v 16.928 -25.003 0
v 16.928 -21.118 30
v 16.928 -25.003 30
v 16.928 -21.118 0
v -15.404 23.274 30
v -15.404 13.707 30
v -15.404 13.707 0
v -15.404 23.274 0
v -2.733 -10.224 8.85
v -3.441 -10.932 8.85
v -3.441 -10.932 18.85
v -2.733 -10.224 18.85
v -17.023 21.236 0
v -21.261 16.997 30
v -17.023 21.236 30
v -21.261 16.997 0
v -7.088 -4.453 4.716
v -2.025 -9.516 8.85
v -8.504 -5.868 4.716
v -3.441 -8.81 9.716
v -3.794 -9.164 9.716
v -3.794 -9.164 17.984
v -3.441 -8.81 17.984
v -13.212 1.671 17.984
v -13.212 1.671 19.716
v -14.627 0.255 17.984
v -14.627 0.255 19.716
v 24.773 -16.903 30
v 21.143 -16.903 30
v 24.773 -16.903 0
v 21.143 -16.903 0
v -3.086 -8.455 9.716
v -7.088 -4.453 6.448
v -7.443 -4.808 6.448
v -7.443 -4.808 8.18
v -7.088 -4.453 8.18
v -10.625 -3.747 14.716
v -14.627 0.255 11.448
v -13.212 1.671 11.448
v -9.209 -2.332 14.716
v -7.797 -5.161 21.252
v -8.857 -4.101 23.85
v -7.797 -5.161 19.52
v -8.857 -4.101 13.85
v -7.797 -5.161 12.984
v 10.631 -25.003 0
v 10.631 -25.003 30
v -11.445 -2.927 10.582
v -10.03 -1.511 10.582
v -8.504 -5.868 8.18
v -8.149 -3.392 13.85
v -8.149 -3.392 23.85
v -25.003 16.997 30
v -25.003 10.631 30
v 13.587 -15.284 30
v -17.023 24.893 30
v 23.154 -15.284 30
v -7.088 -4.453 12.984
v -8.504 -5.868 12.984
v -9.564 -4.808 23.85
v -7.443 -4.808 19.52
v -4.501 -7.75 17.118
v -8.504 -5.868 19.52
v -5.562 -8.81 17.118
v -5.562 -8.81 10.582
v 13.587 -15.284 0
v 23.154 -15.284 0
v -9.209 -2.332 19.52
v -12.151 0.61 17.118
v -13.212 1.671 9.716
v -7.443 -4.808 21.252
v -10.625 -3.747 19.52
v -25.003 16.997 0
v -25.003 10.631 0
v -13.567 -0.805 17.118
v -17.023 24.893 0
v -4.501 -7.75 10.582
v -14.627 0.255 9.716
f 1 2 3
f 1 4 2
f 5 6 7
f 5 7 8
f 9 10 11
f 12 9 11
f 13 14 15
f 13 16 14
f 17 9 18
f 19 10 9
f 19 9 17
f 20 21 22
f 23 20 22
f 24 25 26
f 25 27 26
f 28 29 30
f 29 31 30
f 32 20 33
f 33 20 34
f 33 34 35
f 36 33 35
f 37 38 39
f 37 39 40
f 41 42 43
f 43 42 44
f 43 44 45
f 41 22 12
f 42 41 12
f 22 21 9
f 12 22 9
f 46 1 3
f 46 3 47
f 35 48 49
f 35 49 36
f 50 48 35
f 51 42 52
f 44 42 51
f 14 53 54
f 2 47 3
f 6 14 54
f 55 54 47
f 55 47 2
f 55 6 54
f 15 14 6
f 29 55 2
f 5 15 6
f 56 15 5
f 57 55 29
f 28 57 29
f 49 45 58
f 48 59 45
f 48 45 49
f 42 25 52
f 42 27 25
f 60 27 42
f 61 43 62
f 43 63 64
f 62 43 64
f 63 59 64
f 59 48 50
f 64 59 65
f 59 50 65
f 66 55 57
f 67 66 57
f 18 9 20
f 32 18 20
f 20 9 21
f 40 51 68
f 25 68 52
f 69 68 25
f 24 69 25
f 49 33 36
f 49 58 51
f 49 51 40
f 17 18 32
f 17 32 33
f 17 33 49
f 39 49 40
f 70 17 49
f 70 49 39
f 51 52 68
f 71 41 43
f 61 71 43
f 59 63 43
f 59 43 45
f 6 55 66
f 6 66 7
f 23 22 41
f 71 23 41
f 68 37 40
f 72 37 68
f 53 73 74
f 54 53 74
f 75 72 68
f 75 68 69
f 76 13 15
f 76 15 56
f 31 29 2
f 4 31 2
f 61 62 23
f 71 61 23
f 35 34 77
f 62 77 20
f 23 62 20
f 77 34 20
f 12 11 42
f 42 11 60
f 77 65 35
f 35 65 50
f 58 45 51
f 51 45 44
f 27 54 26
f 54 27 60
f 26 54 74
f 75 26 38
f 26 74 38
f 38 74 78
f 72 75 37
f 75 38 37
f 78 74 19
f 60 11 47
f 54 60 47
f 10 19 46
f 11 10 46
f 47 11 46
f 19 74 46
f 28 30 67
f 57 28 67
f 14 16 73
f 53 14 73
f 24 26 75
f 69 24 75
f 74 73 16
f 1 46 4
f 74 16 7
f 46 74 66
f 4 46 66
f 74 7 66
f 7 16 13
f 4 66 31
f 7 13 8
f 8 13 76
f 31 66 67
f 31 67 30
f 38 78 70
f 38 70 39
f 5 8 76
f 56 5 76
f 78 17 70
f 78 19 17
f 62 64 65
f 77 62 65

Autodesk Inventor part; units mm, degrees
ref_plane "YZ Plane" through (0, 0, 0) normal (1, 0, 0) x (0, 1, 0)
ref_plane "XZ Plane" through (0, 0, 0) normal (0, 1, 0) x (-1, 0, 0)
sketch "Sketch1" plane through (0, 0, 0) normal (0, 0, 1) x (1, 0, 0)
  line L0 (21.1431, -16.9027) -> (16.9281, -21.1177)
  line L1 (-21.2613, 16.9973) -> (-17.0227, 21.2358)
  line L2 (-17.0227, 21.2358) -> (16.9281, -21.1177) construction
  line L3 (21.1431, -16.9027) -> (-21.2613, 16.9973) construction
  line L4 (-17.0227, 21.2358) -> (36.8231, 21.2358) construction
  line L5 (16.9281, -21.1177) -> (16.9281, -25.0027)
  line L6 (-17.0227, 21.2358) -> (-17.0227, 24.8927)
  line L7 (21.1431, -16.9027) -> (24.7727, -16.9027)
  line L8 (24.7727, -16.9027) -> (-17.0227, 24.8927)
  line L9 (-25.0027, 16.9973) -> (-25.0027, 10.6306)
  line L10 (16.9281, -25.0027) -> (10.6306, -25.0027)
  line L11 (-25.0027, 10.6306) -> (10.6306, -25.0027)
  line L12 (-25.0027, 16.9973) -> (-7.0741, 16.9973) construction
  line L13 (-17.1227, 21.2773) -> (-21.3027, 17.0973)
  line L14 (16.8927, -21.1827) -> (21.0727, -17.0027)
  line L15 (24.7727, -17.0027) -> (21.1414, -17.0027)
  line L16 (22.7727, -25.0027) -> (-23.0273, -25.0027)
  line L17 (16.8927, -25.0027) -> (16.8927, -21.2526)
  line L18 (-17.1227, 25.0973) -> (-17.1227, 21.3471)
  line L19 (-25.0027, 17.0973) -> (-21.3714, 17.0973)
  line L20 (-21.2613, 16.9973) -> (-25.0027, 16.9973)
  point P0 (0, 0)
  point P1 (16.8927, -21.2526)
extrude "Extrusion1" add sketch "Sketch1" along normal blind 30
ref_plane "Work Plane1" through (16.9, -16.9, -8) normal (-0.7071068, -0.7071068, 0) x (0, 0, 1)
sketch "Sketch7" plane through (0, 0, 30) normal (0, 0, 1) x (1, 0, 0)
  line L0 (21.1431, -16.9027) -> (24.7727, -16.9027) projected
  line L1 (24.7727, -16.9027) -> (-17.0227, 24.8927) projected
  line L2 (-17.0227, 24.8927) -> (-17.0227, 21.2358) projected
  line L3 (-17.0227, 21.2358) -> (-21.2613, 16.9973) projected
  line L4 (-21.2613, 16.9973) -> (-25.0027, 16.9973) projected
  line L5 (-25.0027, 16.9973) -> (-25.0027, 10.6306) projected
  line L6 (-25.0027, 10.6306) -> (10.6306, -25.0027) projected
  line L7 (10.6306, -25.0027) -> (16.9281, -25.0027) projected
  line L8 (16.9281, -25.0027) -> (16.9281, -21.1177) projected
  line L9 (16.9281, -21.1177) -> (21.1431, -16.9027) projected
  line L10 (3.875, 3.995) -> (-7.1861, -7.1861)
  line L11 (-25.0027, 10.6306) -> (10.6306, -25.0027) projected
  line L12 (23.1542, -5.7172) -> (13.5872, -15.2842)
  line L13 (13.5872, -15.2842) -> (-15.4042, 13.7072)
  line L14 (-15.4042, 13.7072) -> (-5.8372, 23.2742)
  line L15 (-5.8372, 23.2742) -> (23.1542, -5.7172)
  line L16 (23.1542, -5.7172) -> (-15.4042, 13.7072) construction
  line L17 (13.5872, -15.2842) -> (-5.8372, 23.2742) construction
  line L18 (-15.4042, 13.7072) -> (-15.4042, 23.2742)
  line L19 (24.7727, -16.9027) -> (-17.0227, 24.8927) projected
  line L20 (13.5872, -15.2842) -> (23.1542, -15.2842)
  point P0 (0, 0)
  dimension "d28" = 41
  dimension "d29" = 1.2
  dimension "d74" = 0
extrude "Extrusion7" cut sketch "Sketch7" against normal through all contours L20 L12 L1 | L12 L13 L10 L1 | L1 L14 L15 L12 | L10 L13 L14 L1 | L14 L18 L1
sketch "Sketch10" plane through (10.6306, -25.0027, 30) normal (-0.7071068, -0.7071068, 0) x (-0.7071068, 0.7071068, 0)
  line L0 (1.6838, 16.5215) -> (7.0744, 19.4702) construction
  line L1 (7.0744, 19.4702) -> (7.0744, 10.5304) construction
  line L2 (7.0744, 10.5304) -> (1.6838, 10.5304) construction
  line L3 (1.6838, 10.5304) -> (1.6838, 6.839) construction
  line L4 (1.6838, 6.839) -> (6.7206, 6.839) construction
  line L5 (6.7206, 6.839) -> (6.7206, 1.2092) construction
  line L6 (6.7206, 1.2092) -> (1.6838, 1.2092) construction
  line L7 (1.6838, 1.2092) -> (1.6838, -3.423) construction
  line L8 (1.6838, -3.423) -> (55.1934, -3.423) construction
  line L9 (1.6838, 30.377) -> (1.6838, 26.2152) construction
  line L10 (1.6838, 26.2152) -> (7.1181, 26.2152) construction
  line L11 (7.1181, 26.2152) -> (7.1181, 20.0634) construction
  line L12 (7.1181, 20.0634) -> (1.6838, 20.0634) construction
  line L13 (1.6838, 20.0634) -> (1.6838, 16.5215) construction
  line L14 (7.0744, 15.0003) -> (55.1934, 14.9149) construction
  line L15 (1.6838, 30.377) -> (36.6838, 30.377) construction
  line L16 (36.6838, -3.423) -> (1.6838, -3.423) construction
  line L17 (19.8996, 21.1501) -> (19.8996, 11.1501)
  line L18 (19.8996, 11.1501) -> (28.5599, 6.1501)
  line L19 (19.8996, 21.1501) -> (21.3996, 20.2841)
  line L20 (21.3996, 20.2841) -> (21.3996, 12.0161)
  line L21 (21.3996, 12.0161) -> (27.0599, 8.7482)
  line L22 (27.0599, 8.7482) -> (27.0599, 17.0161)
  line L23 (27.0599, 17.0161) -> (28.5599, 16.1501)
  line L24 (28.5599, 16.1501) -> (28.5599, 6.1501)
  line L25 (50.3931, 0) -> (0, 0) construction
  line L26 (50.3931, 30) -> (50.3931, 0) construction
  line L27 (50.3931, 15) -> (0, 15) construction
  line L28 (0, 30) -> (0, 0) construction
  point P0 (25.1966, 30)
  point P1 (25.1966, 15)
  dimension "d40" = 1.5
  dimension "d41" = 1.5
  dimension "d42" = 1.5
  dimension "d43" = 10
  dimension "d44" = 10
  dimension "d75" = 8.268
  dimension "d76" = 120
emboss "Emboss1" sketch "Sketch10" operation cut depth 1 direction (0.7071068, 0.7071068, 0)
sketch "Sketch11" plane through (10.6306, -25.0027, 30) normal (-0.7071068, -0.7071068, 0) x (-0.7071068, 0.7071068, 0)
  line L0 (21.3996, 12.0161) -> (27.0599, 8.7482) construction
  line L1 (27.0599, 8.7482) -> (27.0599, 17.0161) construction
  line L2 (27.0599, 17.0161) -> (28.5599, 16.1501) construction
  line L3 (28.5599, 16.1501) -> (28.5599, 6.1501) construction
  line L4 (28.5599, 6.1501) -> (19.8996, 11.1501) construction
  line L5 (19.8996, 11.1501) -> (19.8996, 21.1501) construction
  line L6 (19.8996, 21.1501) -> (21.3996, 20.2841) construction
  line L7 (21.3996, 20.2841) -> (21.3996, 12.0161) construction
  line L8 (50.3931, 30) -> (0, 30) construction
  line L9 (0, 30) -> (0, 0) construction
  line L10 (50.3931, 0) -> (0, 0) construction
  line L11 (50.3931, 30) -> (50.3931, 0) construction
  line L12 (9.2379, 27.3057) -> (21.3996, 20.2841) construction
  line L13 (21.3996, 20.2841) -> (21.3996, 12.0161) construction
  line L14 (21.3996, 12.0161) -> (27.0599, 8.7482) construction
  line L15 (27.0599, 8.7482) -> (27.0599, 7.4216) construction
  line L16 (27.0599, 7.4216) -> (17.8982, 13.0177) construction
  line L17 (17.8982, 13.0177) -> (17.8982, 3.0177) construction
  line L18 (17.8982, 3.0177) -> (9.2379, 8.0177) construction
  line L19 (9.2379, 8.0177) -> (9.2379, 27.3057) construction
  line L20 (15.5651, 18.4016) -> (15.5, -16.9) construction
  line L21 (15.5651, 18.4016) -> (-17.5, 16.9) construction
  line L22 (-17.5, 16.9) -> (-17.5, 12.7382) construction
  line L23 (-17.5, 12.7382) -> (-12.0658, 12.7382) construction
  line L24 (-12.0658, 12.7382) -> (-12.0658, 6.5864) construction
  line L25 (-12.0658, 6.5864) -> (-17.5, 6.5864) construction
  line L26 (-17.5, 6.5864) -> (-17.5, 3.0446) construction
  line L27 (-17.5, 3.0446) -> (-12.1095, 3.0446) construction
  line L28 (-12.1095, 3.0446) -> (-12.1095, -2.9465) construction
  line L29 (-12.1095, -2.9465) -> (-17.5, -2.9465) construction
  line L30 (-17.5, -2.9465) -> (-17.5, -6.638) construction
  line L31 (-17.5, -6.638) -> (-12.4632, -6.638) construction
  line L32 (-12.4632, -6.638) -> (-12.4632, -12.2678) construction
  line L33 (-12.4632, -12.2678) -> (-17.5, -12.2678) construction
  line L34 (-17.5, -12.2678) -> (-17.5, -16.9) construction
  line L35 (-17.5, -16.9) -> (15.5, -16.9) construction
  line L36 (-12.1095, 0.049) -> (15.5326, 0.7508) construction
  line L37 (15.5, -16.9) -> (15.5651, 18.4016) construction
  line L38 (1.91, 17.7815) -> (1.91, -16.9) construction
  line L39 (15.5, -16.9) -> (-17.5, -16.9) construction
  line L40 (27.0599, 8.7482) -> (27.0599, 7.4216) construction
  line L41 (21.3996, 20.2841) -> (21.3996, 12.0161)
  line L42 (21.3996, 12.0161) -> (27.0599, 8.7482)
  line L43 (21.3996, 20.2841) -> (21.3996, 12.0161)
  line L44 (21.3996, 12.0161) -> (27.0599, 8.7482)
  line L45 (27.0599, 8.7482) -> (27.0599, 10.4802)
  line L46 (27.0599, 8.7482) -> (27.0599, 7.4216)
  line L47 (27.0599, 10.4802) -> (22.8996, 12.8822)
  line L48 (22.8996, 12.8822) -> (22.8996, 19.4181)
  line L49 (22.8996, 19.4181) -> (27.0599, 21.82)
  line L50 (21.3996, 20.2841) -> (27.0599, 23.552)
  line L51 (27.0599, 23.552) -> (27.0599, 21.82)
  point P0 (25.1966, 30)
  point P1 (20.9754, 14.9785)
  dimension "d47" = 120
  dimension "d48" = 1.5
  dimension "d49" = 1.5
  dimension "d50" = 1.5
  dimension "d77" = 8.268
  dimension "d78" = 4.1602
  dimension "d79" = 5.6602
  dimension "d80" = 120
  dimension "d81" = 120
emboss "Emboss2" sketch "Sketch11" operation cut depth 1.5 direction (0.7071068, 0.7071068, 0)
sketch "Sketch12" plane through (10.6306, -25.0027, 30) normal (-0.7071068, -0.7071068, 0) x (-0.7071068, 0.7071068, 0)
  line L0 (22.8996, 12.8822) -> (27.0599, 10.4802) construction
  line L1 (27.0599, 10.4802) -> (27.0599, 17.0161) construction
  line L2 (27.0599, 17.0161) -> (28.5599, 16.1501) construction
  line L3 (28.5599, 16.1501) -> (28.5599, 6.1501) construction
  line L4 (28.5599, 6.1501) -> (19.8996, 11.1501) construction
  line L5 (19.8996, 11.1501) -> (19.8996, 21.1501) construction
  line L6 (19.8996, 21.1501) -> (21.3996, 20.2841) construction
  line L7 (21.3996, 20.2841) -> (27.0599, 23.552) construction
  line L8 (27.0599, 23.552) -> (27.0599, 21.82) construction
  line L9 (27.0599, 21.82) -> (22.8996, 19.4181) construction
  line L10 (22.8996, 19.4181) -> (22.8996, 12.8822) construction
  line L11 (50.3931, 30) -> (0, 30) construction
  line L12 (0, 30) -> (0, 0) construction
  line L13 (50.3931, 0) -> (0, 0) construction
  line L14 (50.3931, 30) -> (50.3931, 0) construction
  line L15 (12.7689, 9.4432) -> (16.9291, 7.0413) construction
  line L16 (16.9291, 7.0413) -> (27.0599, 17.0161) construction
  line L17 (27.0599, 17.0161) -> (28.5599, 16.1501) construction
  line L18 (28.5599, 16.1501) -> (28.5599, 6.1501) construction
  line L19 (28.5599, 6.1501) -> (13.0911, 5.9826) construction
  line L20 (13.0911, 5.9826) -> (19.8996, 21.1501) construction
  line L21 (19.8996, 21.1501) -> (21.3996, 20.2841) construction
  line L22 (21.3996, 20.2841) -> (27.0599, 23.552) construction
  line L23 (27.0599, 23.552) -> (27.0599, 21.82) construction
  line L24 (27.0599, 21.82) -> (12.7689, 15.9791) construction
  line L25 (12.7689, 15.9791) -> (12.7689, 9.4432) construction
  line L26 (-17.5, 16.9) -> (-17.5, 12.7382) construction
  line L27 (-17.5, 12.7382) -> (-12.0658, 12.7382) construction
  line L28 (-12.0658, 12.7382) -> (-12.0658, 6.5864) construction
  line L29 (-12.0658, 6.5864) -> (-17.5, 6.5864) construction
  line L30 (-17.5, 6.5864) -> (-17.5, 3.0446) construction
  line L31 (-17.5, 3.0446) -> (-12.1095, 3.0446) construction
  line L32 (-12.1095, 3.0446) -> (-12.1095, -2.9465) construction
  line L33 (-12.1095, -2.9465) -> (-17.5, -2.9465) construction
  line L34 (-17.5, -2.9465) -> (-17.5, -6.638) construction
  line L35 (-17.5, -6.638) -> (-12.4632, -6.638) construction
  line L36 (-12.4632, -6.638) -> (-12.4632, -12.2678) construction
  line L37 (-12.4632, -12.2678) -> (-17.5, -12.2678) construction
  line L38 (-17.5, -12.2678) -> (-17.5, -16.9) construction
  line L39 (-17.5, -16.9) -> (15.5, -16.9) construction
  line L40 (21.3996, 20.2841) -> (27.0599, 23.552)
  line L41 (19.8996, 21.1501) -> (21.3996, 20.2841)
  line L42 (21.3996, 20.2841) -> (27.0599, 23.552)
  line L43 (27.0599, 23.552) -> (27.0599, 21.82)
  line L44 (27.0599, 23.552) -> (27.0599, 21.82)
  line L45 (16.9291, 7.0413) -> (27.0599, 17.0161) construction
  line L46 (19.8996, 21.1501) -> (27.0599, 25.2841)
  line L47 (27.0599, 25.2841) -> (35.7201, 20.2841)
  line L48 (35.7201, 20.2841) -> (35.7201, 18.552)
  line L49 (35.7201, 18.552) -> (30.0599, 15.2841)
  line L50 (30.0599, 15.2841) -> (30.0599, 10.4802)
  line L51 (30.0599, 10.4802) -> (34.2201, 12.8822)
  line L52 (35.7201, 10.2841) -> (35.7201, 10.2841)
  line L53 (35.7201, 10.2841) -> (28.5599, 6.1501)
  line L54 (27.0599, 17.0161) -> (28.5599, 16.1501)
  line L55 (28.5599, 6.1501) -> (28.5599, 16.1501)
  line L56 (28.5599, 16.1501) -> (27.0599, 17.0161)
  line L57 (27.0599, 21.82) -> (27.0599, 23.552)
  line L58 (28.5599, 16.1501) -> (28.5599, 6.1501)
  line L59 (27.0599, 17.0161) -> (31.2201, 19.4181)
  line L60 (31.2201, 19.4181) -> (27.0599, 21.82)
  line L61 (13.0911, 5.9826) -> (28.5599, 6.1501) construction
  line L62 (12.7689, 9.4432) -> (16.9291, 7.0413) construction
  line L63 (12.7689, 9.4432) -> (28.5599, 9.6142) construction
  line L64 (28.5599, 9.6142) -> (29.486, 10.1489) construction
  line L65 (28.5599, 16.1501) -> (35.7201, 20.2841) construction
  line L66 (28.5599, 6.1501) -> (34.2971, 9.4625) construction
  line L67 (31.2201, 19.4181) -> (35.3769, 18.7502) construction
  line L68 (27.0599, 23.552) -> (27.0599, 21.82) construction
  line L69 (35.3769, 18.7502) -> (27.0599, 23.552) construction
  line L70 (35.7201, 10.2841) -> (35.7201, 12.0161)
  line L71 (35.7201, 12.0161) -> (34.2201, 12.8822)
  line L72 (16.3223, 7.4494) -> (20.4826, 5.0475) construction
  line L73 (16.3223, 13.9853) -> (16.3223, 7.4494) construction
  line L74 (20.4826, 16.3872) -> (16.3223, 13.9853) construction
  line L75 (20.4826, 18.1193) -> (20.4826, 16.3872) construction
  line L76 (14.8223, 14.8513) -> (20.4826, 18.1193) construction
  line L77 (14.8223, 15.7065) -> (14.8223, 14.8513) construction
  line L78 (20.4826, 12.5307) -> (14.8223, 15.7065) construction
  line L79 (20.4826, 5.0475) -> (20.4826, 12.5307) construction
  line L80 (20.4826, 12.5307) -> (28.5599, 7.9987) construction
  line L81 (28.5599, 7.9987) -> (33.93, 11.0117) construction
  point P0 (25.1966, 30)
  point P1 (20.9754, 14.9785)
  dimension "d54" = 60
  dimension "d55" = 1.5
  dimension "d57" = 120
  dimension "d58" = 1.5
  dimension "d59" = 120
  dimension "d82" = 3
  dimension "d83" = 3
  dimension "d84" = 3
  dimension "d85" = 1.5
  dimension "d86" = 7.1602
  dimension "d87" = 7.1602
  dimension "d88" = 4.1602
  dimension "d89" = 1.7321
  dimension "d90" = 5.6602
  dimension "d91" = 1.7321
  dimension "d92" = 4.1602
extrude "Extrusion9" cut sketch "Sketch12" against normal blind 2
ref_plane "Arbeitsebene4" through (-16.9409, 16.9409, 0) normal (-0.7071068, -0.7071068, 0) x (0, 0, 1)
ref_plane "Arbeitsebene5" through (-2.1793, -2.1793, 0) normal (-0.7071068, 0.7071068, 0) x (-0.7071068, -0.7071068, 0)
sketch "Skizze15" plane through (-15.4042, 13.7072, 0) normal (0.7071068, 0.7071068, 0) x (-0.7071068, 0.7071068, 0)
  point P0 (-20.5849, 0)
equation "\"d3\" = MirrorThickness1"
equation "\"d41\" = d40"
equation "\"d42\" = d40"
equation "\"d44\" = d43"
equation "\"d48\" = d51"
equation "\"d49\" = d51"
equation "\"d50\" = d51"
equation "\"d55\" = d60"
equation "\"d58\" = d60"
equation "\"MirrorThickness1\" = 30"
equation "\"d51\" = 1.5"
equation "\"d60\" = 1.5"
properties part number "20_Cube_Insert_Mirror_Holder_wLogo_Astromedia_30x40x1_v3"
